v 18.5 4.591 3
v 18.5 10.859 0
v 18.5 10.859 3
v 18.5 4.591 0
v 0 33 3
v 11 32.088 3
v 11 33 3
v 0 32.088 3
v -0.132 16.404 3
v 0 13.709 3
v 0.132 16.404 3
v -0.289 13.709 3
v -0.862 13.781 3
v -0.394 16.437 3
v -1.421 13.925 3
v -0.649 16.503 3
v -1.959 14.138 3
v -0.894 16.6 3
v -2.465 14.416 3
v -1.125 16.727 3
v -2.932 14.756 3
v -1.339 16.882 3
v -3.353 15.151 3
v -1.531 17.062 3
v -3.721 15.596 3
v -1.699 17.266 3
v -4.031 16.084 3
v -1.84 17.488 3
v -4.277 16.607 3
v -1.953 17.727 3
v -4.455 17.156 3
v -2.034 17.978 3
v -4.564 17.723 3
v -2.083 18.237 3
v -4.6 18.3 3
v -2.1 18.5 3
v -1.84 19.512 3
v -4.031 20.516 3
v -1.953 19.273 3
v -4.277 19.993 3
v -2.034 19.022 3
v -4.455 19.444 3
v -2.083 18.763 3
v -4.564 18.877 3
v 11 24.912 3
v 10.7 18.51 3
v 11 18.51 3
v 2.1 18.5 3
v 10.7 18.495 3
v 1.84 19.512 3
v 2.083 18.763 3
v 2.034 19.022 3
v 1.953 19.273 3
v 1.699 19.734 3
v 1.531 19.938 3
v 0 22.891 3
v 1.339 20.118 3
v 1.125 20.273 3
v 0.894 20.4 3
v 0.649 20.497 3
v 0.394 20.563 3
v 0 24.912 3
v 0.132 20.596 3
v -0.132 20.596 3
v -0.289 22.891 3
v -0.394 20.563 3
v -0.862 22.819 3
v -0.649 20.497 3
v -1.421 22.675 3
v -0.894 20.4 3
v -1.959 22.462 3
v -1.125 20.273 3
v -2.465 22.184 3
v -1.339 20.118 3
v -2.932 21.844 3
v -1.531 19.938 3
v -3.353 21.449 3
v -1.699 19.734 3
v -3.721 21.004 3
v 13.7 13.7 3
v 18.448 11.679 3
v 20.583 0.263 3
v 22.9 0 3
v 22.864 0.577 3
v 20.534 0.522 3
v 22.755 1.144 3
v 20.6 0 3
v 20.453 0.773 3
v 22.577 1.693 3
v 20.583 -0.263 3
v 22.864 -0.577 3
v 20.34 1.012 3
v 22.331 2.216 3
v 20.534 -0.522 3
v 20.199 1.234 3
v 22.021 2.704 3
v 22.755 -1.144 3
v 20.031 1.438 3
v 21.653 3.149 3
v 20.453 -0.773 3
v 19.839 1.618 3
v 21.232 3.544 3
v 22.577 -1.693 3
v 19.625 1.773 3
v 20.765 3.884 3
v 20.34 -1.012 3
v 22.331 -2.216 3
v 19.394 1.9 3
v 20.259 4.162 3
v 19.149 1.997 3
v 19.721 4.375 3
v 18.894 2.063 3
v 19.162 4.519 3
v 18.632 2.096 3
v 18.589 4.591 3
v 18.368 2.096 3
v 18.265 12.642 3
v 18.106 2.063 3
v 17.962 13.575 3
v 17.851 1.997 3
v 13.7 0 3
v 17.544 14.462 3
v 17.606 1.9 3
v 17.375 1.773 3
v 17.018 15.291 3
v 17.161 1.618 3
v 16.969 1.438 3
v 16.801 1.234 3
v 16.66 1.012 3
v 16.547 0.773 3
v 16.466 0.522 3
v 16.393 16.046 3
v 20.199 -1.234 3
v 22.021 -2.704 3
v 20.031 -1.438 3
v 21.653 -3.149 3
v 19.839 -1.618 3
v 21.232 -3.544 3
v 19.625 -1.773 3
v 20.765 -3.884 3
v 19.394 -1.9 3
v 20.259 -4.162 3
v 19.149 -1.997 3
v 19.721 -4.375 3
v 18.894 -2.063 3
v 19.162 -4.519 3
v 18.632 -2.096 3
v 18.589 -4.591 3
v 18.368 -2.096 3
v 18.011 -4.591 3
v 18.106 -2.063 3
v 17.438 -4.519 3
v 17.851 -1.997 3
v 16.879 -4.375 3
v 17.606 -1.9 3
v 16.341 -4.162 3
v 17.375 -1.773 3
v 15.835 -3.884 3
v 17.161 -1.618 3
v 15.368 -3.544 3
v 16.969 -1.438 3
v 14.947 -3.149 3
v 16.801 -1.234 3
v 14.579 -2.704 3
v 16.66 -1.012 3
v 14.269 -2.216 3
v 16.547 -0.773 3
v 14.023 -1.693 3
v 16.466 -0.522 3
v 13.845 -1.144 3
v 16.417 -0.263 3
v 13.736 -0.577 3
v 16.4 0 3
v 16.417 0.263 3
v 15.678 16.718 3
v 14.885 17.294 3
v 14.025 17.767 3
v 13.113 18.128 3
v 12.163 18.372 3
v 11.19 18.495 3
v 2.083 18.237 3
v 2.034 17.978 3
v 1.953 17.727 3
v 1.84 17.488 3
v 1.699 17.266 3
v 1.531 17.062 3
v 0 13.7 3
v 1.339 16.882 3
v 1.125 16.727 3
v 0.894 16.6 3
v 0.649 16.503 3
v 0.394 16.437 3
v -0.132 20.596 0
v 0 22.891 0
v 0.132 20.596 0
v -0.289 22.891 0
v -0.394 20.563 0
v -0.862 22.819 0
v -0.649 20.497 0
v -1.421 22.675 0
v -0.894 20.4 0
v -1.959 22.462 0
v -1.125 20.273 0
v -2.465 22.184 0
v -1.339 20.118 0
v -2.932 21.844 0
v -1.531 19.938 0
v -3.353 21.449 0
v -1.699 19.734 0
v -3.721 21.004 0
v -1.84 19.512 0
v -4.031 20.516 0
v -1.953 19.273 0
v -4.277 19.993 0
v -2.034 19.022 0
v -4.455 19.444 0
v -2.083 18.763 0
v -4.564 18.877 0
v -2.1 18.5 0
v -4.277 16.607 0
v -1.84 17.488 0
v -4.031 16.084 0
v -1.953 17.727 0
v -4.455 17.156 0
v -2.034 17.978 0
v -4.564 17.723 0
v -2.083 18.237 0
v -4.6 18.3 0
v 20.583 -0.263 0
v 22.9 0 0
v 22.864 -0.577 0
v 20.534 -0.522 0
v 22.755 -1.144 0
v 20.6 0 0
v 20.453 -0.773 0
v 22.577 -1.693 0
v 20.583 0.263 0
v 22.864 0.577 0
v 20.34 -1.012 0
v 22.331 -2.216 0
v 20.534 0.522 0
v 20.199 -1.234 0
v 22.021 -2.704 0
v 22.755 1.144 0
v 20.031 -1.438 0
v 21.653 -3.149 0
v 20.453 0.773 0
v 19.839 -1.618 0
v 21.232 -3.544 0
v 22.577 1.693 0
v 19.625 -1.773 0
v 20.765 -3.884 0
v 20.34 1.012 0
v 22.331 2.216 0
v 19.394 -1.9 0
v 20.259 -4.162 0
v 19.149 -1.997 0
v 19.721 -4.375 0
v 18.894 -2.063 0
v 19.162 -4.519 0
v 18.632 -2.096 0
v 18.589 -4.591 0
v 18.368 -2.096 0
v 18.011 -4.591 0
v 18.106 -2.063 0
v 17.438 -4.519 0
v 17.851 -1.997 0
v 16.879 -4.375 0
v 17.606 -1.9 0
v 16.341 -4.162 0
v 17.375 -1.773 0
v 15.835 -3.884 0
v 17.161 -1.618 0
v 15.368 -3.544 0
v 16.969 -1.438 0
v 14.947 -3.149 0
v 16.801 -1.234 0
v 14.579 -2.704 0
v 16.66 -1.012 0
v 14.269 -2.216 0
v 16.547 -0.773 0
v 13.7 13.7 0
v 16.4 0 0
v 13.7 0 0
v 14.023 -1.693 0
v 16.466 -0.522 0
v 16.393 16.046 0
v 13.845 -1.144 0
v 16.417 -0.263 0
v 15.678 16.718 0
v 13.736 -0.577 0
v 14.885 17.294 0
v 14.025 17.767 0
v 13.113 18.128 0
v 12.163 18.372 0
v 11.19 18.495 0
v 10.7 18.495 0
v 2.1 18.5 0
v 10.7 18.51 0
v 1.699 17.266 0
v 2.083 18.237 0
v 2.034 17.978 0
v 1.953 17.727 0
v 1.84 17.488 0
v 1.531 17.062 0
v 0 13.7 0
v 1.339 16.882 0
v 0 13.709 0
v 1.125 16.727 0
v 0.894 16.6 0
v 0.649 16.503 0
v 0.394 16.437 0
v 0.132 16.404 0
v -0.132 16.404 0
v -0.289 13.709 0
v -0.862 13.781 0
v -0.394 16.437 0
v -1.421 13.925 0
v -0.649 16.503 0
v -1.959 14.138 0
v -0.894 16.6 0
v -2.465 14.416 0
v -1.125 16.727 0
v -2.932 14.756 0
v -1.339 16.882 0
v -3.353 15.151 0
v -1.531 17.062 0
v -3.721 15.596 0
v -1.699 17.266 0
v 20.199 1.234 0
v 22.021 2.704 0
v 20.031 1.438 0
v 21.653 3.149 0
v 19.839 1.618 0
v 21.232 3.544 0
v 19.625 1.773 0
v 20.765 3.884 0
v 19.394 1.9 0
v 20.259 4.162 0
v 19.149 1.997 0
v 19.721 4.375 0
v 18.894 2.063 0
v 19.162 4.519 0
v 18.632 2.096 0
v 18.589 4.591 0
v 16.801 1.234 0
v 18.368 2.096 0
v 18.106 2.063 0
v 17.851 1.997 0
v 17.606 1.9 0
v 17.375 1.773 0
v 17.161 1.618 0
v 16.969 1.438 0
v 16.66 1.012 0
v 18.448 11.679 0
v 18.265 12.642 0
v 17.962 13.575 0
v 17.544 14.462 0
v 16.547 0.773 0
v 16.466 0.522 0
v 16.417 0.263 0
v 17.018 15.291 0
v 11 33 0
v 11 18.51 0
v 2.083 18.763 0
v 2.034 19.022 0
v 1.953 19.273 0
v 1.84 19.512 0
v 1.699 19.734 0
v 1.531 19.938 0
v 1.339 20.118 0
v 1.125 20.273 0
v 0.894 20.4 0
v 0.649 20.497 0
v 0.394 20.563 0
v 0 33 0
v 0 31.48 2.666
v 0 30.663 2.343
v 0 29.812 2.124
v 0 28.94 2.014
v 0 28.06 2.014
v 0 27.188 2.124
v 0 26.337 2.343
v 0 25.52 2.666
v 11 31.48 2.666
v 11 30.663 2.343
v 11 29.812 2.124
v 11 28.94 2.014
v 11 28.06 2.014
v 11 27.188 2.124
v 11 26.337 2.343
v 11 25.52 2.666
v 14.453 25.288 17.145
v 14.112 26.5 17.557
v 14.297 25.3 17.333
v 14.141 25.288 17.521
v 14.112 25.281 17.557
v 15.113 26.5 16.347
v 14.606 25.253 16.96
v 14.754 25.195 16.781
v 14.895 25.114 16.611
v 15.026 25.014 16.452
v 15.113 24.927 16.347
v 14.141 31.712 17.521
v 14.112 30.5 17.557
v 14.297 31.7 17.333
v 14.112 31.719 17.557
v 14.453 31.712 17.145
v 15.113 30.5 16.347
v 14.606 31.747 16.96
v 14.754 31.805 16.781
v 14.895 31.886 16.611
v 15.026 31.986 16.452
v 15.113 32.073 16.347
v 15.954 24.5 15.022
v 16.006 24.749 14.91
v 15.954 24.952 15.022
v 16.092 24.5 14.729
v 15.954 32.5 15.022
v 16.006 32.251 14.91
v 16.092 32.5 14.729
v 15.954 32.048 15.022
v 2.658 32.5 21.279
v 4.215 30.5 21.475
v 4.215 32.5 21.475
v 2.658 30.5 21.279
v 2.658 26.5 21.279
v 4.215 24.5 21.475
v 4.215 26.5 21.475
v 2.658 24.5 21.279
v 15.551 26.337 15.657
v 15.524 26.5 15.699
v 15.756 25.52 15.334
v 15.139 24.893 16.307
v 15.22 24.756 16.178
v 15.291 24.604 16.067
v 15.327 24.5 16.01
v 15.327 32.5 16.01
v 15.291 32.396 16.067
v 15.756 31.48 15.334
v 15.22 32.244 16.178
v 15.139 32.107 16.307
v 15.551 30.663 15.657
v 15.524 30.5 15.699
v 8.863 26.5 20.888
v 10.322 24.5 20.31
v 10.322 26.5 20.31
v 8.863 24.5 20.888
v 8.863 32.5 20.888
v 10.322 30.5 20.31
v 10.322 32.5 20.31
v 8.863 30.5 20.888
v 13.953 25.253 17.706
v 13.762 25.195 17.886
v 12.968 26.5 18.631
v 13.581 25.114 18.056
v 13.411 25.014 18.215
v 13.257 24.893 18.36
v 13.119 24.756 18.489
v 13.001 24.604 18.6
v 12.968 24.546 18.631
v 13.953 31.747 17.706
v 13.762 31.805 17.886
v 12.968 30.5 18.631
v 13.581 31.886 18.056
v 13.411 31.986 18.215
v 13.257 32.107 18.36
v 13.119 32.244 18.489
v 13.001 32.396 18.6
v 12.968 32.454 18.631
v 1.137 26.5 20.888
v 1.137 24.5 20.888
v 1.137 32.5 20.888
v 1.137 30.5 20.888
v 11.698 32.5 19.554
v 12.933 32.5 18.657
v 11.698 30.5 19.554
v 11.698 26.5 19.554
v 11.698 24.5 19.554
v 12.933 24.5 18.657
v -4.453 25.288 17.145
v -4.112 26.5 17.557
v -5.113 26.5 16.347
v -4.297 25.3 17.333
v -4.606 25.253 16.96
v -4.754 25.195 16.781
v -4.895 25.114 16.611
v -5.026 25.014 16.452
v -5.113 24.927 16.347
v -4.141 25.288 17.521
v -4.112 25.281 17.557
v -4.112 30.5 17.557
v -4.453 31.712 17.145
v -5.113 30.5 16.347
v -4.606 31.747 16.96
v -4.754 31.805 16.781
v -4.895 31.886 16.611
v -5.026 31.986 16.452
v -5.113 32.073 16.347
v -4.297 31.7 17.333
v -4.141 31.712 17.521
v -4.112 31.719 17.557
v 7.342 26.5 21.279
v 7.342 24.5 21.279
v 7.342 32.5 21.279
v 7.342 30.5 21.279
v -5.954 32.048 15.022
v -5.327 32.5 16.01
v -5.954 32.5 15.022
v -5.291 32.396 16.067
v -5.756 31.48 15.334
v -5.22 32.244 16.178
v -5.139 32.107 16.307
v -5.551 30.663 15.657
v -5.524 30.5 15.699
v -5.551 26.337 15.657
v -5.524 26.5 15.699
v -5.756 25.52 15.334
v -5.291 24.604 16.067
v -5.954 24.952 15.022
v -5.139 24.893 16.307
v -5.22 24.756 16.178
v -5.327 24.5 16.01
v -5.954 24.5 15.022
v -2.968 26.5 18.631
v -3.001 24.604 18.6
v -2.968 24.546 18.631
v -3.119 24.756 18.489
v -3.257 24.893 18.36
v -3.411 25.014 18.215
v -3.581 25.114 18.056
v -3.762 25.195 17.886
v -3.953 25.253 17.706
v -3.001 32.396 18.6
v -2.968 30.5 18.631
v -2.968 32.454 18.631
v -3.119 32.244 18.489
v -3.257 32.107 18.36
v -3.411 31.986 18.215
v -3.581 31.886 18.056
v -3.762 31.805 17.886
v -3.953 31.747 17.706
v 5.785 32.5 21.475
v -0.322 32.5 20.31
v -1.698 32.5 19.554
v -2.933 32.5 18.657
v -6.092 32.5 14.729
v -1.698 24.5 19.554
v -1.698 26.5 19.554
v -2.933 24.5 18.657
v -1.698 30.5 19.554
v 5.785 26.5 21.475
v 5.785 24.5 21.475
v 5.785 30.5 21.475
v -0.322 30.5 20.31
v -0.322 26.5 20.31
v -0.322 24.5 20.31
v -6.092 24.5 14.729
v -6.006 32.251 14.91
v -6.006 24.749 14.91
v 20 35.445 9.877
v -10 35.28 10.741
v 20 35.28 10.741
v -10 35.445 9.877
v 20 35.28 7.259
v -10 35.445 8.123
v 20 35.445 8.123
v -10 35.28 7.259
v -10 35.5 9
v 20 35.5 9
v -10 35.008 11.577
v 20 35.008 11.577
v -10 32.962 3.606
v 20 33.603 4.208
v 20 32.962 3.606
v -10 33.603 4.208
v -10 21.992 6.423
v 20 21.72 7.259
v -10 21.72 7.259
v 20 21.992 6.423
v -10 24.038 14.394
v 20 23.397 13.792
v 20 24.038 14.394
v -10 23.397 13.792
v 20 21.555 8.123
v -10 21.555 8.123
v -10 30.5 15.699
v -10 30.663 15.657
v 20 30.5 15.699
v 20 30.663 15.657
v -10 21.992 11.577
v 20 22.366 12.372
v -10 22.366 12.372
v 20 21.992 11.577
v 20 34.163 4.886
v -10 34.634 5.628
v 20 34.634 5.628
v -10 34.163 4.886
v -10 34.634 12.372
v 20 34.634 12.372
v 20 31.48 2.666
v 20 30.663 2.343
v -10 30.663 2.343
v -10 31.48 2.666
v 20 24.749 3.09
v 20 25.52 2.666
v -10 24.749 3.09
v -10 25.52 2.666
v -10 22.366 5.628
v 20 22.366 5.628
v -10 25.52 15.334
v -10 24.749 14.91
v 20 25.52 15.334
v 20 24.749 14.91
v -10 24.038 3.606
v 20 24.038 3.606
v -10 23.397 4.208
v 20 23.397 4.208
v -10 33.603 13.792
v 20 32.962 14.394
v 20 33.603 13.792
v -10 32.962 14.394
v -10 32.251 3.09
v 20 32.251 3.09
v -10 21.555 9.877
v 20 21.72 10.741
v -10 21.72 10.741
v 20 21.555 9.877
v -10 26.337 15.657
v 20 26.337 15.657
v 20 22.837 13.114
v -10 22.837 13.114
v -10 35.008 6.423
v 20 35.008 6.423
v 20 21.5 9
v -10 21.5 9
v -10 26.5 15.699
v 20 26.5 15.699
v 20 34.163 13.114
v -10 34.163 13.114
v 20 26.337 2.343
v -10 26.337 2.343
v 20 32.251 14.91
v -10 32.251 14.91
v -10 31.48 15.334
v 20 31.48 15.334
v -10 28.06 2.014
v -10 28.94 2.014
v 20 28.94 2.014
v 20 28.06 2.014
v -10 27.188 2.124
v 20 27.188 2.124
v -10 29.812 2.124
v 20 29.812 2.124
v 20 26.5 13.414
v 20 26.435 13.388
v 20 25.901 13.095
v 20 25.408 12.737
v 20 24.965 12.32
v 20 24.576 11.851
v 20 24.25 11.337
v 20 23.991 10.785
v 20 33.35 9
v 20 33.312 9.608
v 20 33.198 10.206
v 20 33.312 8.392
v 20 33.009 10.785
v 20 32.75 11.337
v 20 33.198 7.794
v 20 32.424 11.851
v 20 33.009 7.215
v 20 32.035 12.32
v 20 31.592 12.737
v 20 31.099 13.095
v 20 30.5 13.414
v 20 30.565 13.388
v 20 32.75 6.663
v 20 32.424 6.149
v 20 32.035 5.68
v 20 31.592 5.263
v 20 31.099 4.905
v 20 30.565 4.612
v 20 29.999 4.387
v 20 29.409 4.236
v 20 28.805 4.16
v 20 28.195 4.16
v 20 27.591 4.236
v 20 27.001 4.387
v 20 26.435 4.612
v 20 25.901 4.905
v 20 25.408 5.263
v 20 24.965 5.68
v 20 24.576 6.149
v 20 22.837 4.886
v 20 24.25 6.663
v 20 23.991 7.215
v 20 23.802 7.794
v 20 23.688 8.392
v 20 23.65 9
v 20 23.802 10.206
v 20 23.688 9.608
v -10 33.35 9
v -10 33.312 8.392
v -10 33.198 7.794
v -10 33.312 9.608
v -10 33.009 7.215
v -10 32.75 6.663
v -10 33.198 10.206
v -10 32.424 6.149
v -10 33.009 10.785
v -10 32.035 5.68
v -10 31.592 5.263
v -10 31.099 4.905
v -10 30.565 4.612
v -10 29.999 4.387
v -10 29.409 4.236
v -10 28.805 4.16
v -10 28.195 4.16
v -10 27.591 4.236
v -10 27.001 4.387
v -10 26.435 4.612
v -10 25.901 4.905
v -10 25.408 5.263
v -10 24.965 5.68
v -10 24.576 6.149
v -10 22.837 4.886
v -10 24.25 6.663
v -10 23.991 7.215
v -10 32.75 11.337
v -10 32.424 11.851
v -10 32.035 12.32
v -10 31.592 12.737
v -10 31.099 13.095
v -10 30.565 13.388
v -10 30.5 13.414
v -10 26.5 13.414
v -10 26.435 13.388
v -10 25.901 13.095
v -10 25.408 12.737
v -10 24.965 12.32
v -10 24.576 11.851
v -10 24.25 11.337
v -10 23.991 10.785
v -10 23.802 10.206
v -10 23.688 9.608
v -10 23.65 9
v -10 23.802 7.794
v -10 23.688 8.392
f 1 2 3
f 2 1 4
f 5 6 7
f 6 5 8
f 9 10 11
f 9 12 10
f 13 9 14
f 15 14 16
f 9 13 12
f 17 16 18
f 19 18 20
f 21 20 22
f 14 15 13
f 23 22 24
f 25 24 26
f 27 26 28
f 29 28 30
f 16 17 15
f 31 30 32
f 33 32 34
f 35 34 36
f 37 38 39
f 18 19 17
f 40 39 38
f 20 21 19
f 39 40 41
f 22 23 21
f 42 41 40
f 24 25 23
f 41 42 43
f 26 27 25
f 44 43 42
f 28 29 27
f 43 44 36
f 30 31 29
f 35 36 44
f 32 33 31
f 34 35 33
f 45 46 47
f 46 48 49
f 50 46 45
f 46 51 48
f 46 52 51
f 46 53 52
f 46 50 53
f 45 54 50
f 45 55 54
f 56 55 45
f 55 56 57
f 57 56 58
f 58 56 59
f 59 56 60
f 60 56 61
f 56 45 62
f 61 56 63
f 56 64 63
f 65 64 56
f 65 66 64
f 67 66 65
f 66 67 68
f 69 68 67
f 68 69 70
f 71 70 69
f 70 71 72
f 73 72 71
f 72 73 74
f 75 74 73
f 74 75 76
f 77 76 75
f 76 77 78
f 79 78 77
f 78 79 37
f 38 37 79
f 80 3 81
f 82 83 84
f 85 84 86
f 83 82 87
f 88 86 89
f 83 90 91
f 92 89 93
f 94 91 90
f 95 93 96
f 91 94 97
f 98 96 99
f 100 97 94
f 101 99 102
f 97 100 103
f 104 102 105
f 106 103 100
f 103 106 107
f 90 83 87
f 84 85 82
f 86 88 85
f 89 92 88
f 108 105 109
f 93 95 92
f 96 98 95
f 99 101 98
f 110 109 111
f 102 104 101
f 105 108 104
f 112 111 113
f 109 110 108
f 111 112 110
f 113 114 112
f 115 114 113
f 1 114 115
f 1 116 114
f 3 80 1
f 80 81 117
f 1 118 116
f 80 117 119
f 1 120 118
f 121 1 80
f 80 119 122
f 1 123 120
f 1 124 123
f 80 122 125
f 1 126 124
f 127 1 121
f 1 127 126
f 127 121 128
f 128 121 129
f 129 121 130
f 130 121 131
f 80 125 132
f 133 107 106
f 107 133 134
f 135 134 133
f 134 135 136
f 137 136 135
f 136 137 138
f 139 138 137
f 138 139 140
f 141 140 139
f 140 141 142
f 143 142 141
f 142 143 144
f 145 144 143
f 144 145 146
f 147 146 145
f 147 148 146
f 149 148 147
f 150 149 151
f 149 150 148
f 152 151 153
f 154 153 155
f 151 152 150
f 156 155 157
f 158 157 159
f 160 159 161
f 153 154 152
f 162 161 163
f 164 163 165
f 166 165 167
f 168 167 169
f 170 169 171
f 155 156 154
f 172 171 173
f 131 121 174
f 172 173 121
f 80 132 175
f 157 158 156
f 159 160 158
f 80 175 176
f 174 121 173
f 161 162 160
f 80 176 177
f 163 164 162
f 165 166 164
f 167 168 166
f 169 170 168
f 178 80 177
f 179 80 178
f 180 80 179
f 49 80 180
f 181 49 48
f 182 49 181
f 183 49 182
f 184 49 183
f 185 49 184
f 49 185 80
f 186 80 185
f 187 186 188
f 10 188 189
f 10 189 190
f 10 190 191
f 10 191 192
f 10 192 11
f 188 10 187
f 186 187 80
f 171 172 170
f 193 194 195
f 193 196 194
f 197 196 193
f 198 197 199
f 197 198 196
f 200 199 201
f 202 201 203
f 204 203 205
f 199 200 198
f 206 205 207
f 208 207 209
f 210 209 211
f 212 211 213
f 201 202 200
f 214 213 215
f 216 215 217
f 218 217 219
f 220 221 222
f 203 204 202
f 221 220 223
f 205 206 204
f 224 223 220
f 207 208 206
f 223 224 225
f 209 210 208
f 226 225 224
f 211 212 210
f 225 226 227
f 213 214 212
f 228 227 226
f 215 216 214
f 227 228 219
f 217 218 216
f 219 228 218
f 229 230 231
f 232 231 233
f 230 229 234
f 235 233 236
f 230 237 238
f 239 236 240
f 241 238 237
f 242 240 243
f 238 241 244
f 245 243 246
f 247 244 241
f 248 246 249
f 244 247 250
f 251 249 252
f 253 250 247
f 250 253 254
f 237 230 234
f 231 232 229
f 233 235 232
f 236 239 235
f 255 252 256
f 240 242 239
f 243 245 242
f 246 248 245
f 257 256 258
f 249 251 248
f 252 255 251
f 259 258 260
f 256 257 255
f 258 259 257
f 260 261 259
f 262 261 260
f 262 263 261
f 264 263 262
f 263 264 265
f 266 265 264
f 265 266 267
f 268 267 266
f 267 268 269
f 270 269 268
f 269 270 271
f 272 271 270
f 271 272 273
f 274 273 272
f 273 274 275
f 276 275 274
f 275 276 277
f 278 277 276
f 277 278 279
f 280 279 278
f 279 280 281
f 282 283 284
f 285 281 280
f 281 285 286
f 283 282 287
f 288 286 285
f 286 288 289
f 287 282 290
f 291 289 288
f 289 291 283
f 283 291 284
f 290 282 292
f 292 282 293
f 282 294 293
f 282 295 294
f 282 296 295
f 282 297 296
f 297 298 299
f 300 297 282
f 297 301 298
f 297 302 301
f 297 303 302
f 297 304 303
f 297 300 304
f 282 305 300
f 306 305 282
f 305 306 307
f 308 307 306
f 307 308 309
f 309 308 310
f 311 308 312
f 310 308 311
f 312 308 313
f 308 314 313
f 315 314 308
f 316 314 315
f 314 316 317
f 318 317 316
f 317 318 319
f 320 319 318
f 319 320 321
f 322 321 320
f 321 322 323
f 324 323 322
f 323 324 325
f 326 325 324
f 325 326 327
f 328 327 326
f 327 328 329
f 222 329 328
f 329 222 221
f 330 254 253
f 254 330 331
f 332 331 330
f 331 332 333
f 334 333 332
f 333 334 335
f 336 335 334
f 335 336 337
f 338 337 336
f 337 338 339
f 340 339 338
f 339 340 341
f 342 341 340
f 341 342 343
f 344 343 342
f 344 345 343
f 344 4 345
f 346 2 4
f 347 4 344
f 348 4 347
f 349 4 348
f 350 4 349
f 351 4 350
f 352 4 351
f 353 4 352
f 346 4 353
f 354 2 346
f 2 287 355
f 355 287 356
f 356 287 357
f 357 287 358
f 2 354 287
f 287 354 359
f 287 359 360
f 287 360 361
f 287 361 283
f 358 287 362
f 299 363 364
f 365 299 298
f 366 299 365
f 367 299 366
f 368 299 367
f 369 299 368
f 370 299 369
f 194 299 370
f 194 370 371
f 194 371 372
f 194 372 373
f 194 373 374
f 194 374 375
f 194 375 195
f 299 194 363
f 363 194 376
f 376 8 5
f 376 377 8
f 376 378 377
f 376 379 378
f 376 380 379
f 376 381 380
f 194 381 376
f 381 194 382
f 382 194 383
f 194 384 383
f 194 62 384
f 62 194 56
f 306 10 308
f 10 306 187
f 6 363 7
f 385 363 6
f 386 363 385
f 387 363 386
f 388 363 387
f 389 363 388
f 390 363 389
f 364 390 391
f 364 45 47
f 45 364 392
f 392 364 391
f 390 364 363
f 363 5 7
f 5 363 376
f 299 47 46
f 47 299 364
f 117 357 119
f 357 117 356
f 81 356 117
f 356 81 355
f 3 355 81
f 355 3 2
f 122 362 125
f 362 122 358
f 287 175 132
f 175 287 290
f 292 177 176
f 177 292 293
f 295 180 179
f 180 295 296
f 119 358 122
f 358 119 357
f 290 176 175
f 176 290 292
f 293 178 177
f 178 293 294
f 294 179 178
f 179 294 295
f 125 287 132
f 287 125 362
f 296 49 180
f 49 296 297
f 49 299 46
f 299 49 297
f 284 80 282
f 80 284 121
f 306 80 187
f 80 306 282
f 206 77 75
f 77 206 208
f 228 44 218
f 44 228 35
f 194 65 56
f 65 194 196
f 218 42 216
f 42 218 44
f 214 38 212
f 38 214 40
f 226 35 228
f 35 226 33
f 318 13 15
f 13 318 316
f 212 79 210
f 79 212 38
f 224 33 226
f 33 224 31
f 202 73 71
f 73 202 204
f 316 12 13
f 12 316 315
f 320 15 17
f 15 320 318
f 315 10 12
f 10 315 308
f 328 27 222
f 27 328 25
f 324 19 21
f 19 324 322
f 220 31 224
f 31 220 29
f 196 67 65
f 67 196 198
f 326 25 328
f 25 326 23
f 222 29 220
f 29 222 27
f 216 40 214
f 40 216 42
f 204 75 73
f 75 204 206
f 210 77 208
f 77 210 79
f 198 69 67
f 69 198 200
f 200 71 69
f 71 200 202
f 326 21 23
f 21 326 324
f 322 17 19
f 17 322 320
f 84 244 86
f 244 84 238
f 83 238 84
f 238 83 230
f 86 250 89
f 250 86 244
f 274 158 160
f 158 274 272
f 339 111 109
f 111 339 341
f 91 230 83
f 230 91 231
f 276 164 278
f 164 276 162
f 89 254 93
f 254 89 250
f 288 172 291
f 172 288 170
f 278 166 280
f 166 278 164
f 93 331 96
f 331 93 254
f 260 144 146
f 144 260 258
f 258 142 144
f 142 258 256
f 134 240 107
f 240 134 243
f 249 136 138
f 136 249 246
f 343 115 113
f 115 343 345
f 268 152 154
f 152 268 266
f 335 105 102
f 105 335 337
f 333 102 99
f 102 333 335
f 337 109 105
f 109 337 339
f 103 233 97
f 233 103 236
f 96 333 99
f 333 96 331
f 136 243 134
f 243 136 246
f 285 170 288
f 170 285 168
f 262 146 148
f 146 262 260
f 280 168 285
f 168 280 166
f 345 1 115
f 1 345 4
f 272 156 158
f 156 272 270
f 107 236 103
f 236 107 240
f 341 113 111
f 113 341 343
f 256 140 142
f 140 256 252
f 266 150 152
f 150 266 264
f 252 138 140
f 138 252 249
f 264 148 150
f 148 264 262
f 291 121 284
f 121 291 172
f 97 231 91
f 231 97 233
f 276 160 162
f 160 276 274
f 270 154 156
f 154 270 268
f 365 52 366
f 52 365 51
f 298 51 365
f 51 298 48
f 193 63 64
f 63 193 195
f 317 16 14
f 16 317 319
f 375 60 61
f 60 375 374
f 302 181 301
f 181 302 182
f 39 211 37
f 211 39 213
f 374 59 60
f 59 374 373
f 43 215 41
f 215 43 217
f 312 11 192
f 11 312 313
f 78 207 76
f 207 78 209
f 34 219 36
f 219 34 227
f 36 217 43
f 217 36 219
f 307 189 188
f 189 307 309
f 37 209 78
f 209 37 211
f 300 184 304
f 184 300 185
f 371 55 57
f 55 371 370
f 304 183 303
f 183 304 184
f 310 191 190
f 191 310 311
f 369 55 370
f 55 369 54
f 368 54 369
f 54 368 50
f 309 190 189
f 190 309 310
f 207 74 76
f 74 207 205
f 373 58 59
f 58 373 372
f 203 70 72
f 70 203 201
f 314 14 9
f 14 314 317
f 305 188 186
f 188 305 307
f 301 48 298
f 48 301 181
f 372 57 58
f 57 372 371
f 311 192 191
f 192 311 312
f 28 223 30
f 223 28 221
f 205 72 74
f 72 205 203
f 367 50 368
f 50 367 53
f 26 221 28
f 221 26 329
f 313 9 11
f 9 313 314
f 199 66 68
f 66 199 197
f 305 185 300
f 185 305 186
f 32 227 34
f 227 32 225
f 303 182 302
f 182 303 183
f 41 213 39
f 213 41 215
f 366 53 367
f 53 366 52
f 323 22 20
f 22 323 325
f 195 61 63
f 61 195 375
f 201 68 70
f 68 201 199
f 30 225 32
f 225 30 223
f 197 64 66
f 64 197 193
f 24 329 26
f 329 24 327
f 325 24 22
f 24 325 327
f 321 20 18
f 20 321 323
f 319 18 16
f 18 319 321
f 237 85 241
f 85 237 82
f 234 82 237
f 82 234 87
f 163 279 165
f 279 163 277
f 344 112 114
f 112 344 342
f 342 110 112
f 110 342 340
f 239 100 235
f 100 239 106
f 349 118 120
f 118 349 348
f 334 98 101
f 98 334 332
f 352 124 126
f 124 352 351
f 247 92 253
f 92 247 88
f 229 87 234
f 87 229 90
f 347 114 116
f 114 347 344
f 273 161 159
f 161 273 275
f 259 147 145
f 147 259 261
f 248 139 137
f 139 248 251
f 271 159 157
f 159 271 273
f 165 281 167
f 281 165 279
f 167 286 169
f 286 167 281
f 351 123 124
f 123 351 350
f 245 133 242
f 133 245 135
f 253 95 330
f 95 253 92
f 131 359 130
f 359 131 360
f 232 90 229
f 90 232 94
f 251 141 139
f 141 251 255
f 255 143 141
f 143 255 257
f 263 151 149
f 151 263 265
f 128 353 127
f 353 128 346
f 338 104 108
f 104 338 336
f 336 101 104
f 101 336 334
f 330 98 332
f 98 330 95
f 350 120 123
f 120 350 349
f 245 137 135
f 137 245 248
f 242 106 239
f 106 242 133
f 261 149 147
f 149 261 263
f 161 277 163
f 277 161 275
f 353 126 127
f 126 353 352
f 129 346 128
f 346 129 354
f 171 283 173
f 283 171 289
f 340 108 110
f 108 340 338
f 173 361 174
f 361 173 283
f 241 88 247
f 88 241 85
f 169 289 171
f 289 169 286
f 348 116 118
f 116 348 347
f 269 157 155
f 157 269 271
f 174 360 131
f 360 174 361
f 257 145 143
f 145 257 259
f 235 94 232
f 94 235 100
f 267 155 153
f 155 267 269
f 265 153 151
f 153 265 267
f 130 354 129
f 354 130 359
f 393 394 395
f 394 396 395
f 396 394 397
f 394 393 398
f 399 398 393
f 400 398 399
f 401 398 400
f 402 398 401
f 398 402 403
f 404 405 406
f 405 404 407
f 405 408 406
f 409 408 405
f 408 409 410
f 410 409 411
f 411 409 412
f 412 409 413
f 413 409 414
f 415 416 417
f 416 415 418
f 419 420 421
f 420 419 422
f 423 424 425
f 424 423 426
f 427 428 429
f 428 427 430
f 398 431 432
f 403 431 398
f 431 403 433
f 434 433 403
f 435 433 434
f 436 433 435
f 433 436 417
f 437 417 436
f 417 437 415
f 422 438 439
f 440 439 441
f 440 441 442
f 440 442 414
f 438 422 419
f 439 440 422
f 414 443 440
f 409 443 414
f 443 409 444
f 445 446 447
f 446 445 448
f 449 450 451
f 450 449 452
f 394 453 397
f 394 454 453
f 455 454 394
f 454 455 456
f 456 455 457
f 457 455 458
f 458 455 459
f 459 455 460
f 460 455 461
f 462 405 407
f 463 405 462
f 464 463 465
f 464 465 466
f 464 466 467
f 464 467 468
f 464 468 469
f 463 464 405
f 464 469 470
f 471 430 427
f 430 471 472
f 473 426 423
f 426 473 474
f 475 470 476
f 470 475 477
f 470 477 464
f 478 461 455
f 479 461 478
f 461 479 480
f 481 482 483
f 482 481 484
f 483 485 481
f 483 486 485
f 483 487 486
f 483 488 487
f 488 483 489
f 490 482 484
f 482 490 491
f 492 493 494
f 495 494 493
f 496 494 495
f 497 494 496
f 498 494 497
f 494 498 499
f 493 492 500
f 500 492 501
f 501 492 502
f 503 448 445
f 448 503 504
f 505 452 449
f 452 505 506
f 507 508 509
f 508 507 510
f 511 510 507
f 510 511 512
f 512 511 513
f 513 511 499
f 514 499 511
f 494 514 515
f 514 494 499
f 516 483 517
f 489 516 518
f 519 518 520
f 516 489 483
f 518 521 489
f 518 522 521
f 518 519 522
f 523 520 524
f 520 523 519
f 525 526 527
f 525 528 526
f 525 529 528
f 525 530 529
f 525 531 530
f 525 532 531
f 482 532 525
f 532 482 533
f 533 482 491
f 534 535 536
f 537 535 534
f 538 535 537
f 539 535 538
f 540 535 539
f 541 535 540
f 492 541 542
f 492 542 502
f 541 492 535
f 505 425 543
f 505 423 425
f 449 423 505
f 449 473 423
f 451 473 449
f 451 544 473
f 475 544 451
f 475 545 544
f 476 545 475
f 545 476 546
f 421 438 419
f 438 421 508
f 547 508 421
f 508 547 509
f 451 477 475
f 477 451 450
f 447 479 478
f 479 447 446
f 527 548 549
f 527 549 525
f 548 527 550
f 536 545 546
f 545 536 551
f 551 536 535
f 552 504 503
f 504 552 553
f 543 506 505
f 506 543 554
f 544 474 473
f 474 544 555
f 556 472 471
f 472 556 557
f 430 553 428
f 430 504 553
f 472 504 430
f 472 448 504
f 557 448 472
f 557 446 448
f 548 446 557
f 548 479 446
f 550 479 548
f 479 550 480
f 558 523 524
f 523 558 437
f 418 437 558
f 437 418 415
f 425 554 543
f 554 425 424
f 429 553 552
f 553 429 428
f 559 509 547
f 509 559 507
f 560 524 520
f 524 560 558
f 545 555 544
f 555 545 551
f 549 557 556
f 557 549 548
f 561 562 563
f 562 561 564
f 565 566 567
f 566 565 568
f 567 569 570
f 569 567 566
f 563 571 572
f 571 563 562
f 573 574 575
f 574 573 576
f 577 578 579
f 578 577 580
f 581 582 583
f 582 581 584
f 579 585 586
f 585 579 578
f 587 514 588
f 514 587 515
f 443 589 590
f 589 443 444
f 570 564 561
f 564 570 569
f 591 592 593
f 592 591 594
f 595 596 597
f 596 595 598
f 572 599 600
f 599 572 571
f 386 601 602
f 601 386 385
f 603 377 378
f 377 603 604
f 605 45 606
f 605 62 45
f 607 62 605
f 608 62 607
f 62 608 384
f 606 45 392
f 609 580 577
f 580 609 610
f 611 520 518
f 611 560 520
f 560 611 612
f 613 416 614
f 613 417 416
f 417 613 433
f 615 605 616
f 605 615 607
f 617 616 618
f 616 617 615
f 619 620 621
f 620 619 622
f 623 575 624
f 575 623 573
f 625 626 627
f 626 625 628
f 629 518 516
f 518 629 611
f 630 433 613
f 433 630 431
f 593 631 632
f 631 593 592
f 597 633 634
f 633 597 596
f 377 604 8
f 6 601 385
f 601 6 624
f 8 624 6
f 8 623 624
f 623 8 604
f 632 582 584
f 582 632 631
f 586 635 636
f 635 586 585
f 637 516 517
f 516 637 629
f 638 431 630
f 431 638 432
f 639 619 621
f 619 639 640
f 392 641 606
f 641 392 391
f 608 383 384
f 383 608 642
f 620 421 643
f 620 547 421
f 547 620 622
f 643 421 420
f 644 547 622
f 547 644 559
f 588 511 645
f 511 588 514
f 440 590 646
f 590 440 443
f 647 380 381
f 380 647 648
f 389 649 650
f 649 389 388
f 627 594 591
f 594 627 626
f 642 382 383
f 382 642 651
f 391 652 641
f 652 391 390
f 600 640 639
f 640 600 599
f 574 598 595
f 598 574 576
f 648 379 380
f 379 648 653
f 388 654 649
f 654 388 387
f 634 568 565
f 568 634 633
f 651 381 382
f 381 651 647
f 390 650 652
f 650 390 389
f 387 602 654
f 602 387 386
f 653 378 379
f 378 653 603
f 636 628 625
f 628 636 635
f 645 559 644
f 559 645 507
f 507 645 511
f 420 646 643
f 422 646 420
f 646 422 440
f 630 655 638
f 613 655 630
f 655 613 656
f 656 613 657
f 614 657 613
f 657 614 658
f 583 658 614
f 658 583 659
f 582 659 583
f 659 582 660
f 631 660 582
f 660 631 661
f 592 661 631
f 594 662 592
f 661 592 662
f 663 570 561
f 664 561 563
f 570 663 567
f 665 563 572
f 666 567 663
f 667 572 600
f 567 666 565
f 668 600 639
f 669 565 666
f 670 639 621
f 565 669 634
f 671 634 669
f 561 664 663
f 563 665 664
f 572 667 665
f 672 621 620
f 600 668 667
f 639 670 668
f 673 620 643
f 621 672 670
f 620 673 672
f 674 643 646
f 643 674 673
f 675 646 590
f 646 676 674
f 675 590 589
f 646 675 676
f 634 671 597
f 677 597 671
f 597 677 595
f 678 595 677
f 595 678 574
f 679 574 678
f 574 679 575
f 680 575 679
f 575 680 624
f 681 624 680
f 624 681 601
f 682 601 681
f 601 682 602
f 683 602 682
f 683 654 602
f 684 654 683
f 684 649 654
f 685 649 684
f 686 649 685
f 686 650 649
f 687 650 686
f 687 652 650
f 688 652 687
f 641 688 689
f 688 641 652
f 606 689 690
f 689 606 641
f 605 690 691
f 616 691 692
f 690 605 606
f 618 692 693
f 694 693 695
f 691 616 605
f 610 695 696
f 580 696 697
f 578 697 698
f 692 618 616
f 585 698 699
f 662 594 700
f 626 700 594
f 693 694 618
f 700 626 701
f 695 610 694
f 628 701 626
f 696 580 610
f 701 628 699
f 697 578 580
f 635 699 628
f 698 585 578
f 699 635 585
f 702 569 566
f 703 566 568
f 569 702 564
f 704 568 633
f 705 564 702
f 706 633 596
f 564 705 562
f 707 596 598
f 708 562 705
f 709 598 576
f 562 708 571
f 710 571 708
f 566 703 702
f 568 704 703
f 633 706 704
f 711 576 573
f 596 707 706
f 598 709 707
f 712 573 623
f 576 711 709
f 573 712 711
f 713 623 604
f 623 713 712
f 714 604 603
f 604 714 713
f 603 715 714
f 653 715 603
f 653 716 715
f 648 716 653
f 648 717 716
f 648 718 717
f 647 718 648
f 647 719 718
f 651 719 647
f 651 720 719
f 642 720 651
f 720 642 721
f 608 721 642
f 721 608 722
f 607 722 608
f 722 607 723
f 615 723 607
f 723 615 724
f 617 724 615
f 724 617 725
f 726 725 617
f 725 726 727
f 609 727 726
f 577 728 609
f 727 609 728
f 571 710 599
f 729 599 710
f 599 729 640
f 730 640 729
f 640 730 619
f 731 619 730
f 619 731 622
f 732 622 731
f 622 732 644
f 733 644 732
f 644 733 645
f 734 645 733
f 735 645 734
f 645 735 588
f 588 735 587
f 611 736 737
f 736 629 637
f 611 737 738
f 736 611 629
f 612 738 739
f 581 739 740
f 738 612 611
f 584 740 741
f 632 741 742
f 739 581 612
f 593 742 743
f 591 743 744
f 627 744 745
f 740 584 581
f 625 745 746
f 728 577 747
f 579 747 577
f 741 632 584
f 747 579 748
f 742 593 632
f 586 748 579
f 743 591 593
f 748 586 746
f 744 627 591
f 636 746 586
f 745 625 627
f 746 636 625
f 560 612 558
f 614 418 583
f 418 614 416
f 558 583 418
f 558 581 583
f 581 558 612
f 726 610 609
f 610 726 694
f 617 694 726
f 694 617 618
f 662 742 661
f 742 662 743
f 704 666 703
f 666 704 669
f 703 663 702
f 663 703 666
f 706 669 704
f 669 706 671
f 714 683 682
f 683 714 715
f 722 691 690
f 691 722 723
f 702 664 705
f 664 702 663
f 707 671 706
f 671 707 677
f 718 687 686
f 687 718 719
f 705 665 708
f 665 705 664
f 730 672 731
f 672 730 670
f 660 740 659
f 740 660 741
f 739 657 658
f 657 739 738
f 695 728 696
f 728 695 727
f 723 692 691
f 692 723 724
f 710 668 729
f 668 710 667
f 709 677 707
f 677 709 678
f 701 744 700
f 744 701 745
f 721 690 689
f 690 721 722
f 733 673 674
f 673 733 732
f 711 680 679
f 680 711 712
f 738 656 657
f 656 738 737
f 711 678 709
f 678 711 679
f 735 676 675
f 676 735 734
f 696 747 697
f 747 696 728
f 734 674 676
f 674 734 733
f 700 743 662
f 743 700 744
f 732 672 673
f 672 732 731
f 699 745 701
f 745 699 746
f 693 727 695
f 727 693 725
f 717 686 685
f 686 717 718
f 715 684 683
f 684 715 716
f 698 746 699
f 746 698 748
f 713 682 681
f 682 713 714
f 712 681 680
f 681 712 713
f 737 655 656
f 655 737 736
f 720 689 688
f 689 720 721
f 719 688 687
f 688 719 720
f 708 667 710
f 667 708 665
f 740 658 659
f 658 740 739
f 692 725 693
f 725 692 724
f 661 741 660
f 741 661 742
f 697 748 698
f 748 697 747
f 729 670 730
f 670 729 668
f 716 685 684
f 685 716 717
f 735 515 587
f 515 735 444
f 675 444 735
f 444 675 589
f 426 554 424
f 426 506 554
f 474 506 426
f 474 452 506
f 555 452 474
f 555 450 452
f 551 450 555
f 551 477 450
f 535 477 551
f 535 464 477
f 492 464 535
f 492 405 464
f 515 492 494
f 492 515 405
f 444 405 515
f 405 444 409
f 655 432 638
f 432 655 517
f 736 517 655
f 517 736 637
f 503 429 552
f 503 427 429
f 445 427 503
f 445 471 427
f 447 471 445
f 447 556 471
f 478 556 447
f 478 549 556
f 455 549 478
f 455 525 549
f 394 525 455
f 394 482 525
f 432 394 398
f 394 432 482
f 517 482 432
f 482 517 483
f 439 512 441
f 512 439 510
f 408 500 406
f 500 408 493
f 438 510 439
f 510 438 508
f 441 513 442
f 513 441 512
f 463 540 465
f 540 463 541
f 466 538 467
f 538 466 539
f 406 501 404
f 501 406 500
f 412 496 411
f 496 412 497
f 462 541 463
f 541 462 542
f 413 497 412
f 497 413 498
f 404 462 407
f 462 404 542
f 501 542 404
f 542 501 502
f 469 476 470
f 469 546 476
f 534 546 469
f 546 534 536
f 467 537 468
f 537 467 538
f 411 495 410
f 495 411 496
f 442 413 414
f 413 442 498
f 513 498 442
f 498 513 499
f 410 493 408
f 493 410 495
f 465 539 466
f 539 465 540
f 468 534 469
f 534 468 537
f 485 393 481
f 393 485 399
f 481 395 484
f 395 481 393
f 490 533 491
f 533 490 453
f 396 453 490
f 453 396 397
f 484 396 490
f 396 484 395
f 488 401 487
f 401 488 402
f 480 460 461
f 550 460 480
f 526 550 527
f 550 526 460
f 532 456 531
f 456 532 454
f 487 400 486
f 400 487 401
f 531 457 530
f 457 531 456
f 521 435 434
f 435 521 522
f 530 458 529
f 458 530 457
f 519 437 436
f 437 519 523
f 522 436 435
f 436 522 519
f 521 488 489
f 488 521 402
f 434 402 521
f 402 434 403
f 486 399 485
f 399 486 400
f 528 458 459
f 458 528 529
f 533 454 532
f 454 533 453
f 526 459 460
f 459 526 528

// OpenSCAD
_tol=0.2;
$fn=50;

thickS=3;
cstBlock=13.5;
penSize=10;

function toCreat(sideW, sep, long)=long/(sideW+sep);
function wideToSide(x) = x / sqrt(2);

module renfort(
long=5,
wide=5,
sideW=1,
middleW=1,
sep=1
){
	
	translate([-(toCreat(sideW, sep, long)*(sideW+sep))/2+(sideW/2),0])
	for(i=[0:1:toCreat(sideW, sep, long)]){
		translate([i*(sideW+sep),0,0]) rotate([45,0,0]) cube([sideW, wideToSide(wide), wideToSide(wide)], center=true);
	}
	cube([long, middleW, wide], center=true);
}

module chanfrein(r=5, h=10, a=0){
	rotate([0,0,a])difference(){
		cube([r*2, r*2, h], center=true);
		cylinder(r=r, h=h+1, center=true);
		translate([0,-r,0])cube([2*r+1, 2*r, h+1],center=true); //X
		translate([-r,0,0])cube([2*r, 2*r+1, h+1],center=true); //Y
		}
}

module screw(){
	blockT=cstBlock; //taille du block
	ep=5; //distance centre le trou et le block
	thick=thickS; //épaisseur de la piéce
	rScrew=2; //diametre du trou
	overcut=3.01; //chainfrein
	chanfConst=0.01;
	anticut=50;
	
	difference(){
		union(){
				
			difference(){
				union(){
					cube([blockT+ep,blockT+ep, thick ]);
					translate([0,13,0])cube([11,20,thick]);
				}
				
			
				translate([-anticut, -anticut])cube([blockT+_tol+anticut,blockT+_tol+anticut, thick]);
				
				translate([blockT+_tol-overcut+chanfConst,blockT+_tol-overcut+chanfConst,ep/2])chanfrein(r=ep-_tol+overcut, h=thick*2);}
				
			//oeil gauche
			translate([0,blockT+ep-_tol]) cylinder(d=rScrew*2+ep+_tol, h=thick);
			//oeil haut
			translate([blockT+ep-_tol,0]) cylinder(d=rScrew*2+ep+_tol, h=thick);}
		//Trous
		translate([0,blockT+ep]) cylinder(r=rScrew+_tol/2, h=thick*3, center=true);
		translate([blockT+ep,0]) cylinder(r=rScrew+_tol/2, h=thick*3, center=true);}
}

module pen(){
	penDiam=penSize;
	h=30;
	thick=2;
	negatif=0.3;
	gap=4;
	diamHold=25;
	thickHold=2;
	
	diamR = 3;
	advence = 0.7; 

	difference(){
		union(){	
			cylinder(d=penDiam+thick*2, h=h, center=true);
			difference(){
				rotate([0,90,0])cylinder(d=diamHold, h=gap+(thickHold*2), center=true);
				translate([0,diamHold/2,0])cube([gap+(thickHold*2)+1,diamHold,h], center=true);
			}
		}
		cylinder(d=penDiam-negatif, h=h+1, center=true);
		translate([0,-(diamHold)/2,0])cube([gap, diamHold, h+1], center=true);
		translate([gap/2+thickHold+advence,-diamHold/3,0])cylinder(d=diamR, h=diamHold, center=true);
		translate([-(gap/2+thickHold+advence),-diamHold/3,0])cylinder(d=diamR,h=diamHold,center=true);
	}
}

module assemblage(){
	screw();
    translate([5,28.5,9])rotate([-90,0,90])pen();
}

//chanfrein();
//extendeur();
//screw();

assemblage();
